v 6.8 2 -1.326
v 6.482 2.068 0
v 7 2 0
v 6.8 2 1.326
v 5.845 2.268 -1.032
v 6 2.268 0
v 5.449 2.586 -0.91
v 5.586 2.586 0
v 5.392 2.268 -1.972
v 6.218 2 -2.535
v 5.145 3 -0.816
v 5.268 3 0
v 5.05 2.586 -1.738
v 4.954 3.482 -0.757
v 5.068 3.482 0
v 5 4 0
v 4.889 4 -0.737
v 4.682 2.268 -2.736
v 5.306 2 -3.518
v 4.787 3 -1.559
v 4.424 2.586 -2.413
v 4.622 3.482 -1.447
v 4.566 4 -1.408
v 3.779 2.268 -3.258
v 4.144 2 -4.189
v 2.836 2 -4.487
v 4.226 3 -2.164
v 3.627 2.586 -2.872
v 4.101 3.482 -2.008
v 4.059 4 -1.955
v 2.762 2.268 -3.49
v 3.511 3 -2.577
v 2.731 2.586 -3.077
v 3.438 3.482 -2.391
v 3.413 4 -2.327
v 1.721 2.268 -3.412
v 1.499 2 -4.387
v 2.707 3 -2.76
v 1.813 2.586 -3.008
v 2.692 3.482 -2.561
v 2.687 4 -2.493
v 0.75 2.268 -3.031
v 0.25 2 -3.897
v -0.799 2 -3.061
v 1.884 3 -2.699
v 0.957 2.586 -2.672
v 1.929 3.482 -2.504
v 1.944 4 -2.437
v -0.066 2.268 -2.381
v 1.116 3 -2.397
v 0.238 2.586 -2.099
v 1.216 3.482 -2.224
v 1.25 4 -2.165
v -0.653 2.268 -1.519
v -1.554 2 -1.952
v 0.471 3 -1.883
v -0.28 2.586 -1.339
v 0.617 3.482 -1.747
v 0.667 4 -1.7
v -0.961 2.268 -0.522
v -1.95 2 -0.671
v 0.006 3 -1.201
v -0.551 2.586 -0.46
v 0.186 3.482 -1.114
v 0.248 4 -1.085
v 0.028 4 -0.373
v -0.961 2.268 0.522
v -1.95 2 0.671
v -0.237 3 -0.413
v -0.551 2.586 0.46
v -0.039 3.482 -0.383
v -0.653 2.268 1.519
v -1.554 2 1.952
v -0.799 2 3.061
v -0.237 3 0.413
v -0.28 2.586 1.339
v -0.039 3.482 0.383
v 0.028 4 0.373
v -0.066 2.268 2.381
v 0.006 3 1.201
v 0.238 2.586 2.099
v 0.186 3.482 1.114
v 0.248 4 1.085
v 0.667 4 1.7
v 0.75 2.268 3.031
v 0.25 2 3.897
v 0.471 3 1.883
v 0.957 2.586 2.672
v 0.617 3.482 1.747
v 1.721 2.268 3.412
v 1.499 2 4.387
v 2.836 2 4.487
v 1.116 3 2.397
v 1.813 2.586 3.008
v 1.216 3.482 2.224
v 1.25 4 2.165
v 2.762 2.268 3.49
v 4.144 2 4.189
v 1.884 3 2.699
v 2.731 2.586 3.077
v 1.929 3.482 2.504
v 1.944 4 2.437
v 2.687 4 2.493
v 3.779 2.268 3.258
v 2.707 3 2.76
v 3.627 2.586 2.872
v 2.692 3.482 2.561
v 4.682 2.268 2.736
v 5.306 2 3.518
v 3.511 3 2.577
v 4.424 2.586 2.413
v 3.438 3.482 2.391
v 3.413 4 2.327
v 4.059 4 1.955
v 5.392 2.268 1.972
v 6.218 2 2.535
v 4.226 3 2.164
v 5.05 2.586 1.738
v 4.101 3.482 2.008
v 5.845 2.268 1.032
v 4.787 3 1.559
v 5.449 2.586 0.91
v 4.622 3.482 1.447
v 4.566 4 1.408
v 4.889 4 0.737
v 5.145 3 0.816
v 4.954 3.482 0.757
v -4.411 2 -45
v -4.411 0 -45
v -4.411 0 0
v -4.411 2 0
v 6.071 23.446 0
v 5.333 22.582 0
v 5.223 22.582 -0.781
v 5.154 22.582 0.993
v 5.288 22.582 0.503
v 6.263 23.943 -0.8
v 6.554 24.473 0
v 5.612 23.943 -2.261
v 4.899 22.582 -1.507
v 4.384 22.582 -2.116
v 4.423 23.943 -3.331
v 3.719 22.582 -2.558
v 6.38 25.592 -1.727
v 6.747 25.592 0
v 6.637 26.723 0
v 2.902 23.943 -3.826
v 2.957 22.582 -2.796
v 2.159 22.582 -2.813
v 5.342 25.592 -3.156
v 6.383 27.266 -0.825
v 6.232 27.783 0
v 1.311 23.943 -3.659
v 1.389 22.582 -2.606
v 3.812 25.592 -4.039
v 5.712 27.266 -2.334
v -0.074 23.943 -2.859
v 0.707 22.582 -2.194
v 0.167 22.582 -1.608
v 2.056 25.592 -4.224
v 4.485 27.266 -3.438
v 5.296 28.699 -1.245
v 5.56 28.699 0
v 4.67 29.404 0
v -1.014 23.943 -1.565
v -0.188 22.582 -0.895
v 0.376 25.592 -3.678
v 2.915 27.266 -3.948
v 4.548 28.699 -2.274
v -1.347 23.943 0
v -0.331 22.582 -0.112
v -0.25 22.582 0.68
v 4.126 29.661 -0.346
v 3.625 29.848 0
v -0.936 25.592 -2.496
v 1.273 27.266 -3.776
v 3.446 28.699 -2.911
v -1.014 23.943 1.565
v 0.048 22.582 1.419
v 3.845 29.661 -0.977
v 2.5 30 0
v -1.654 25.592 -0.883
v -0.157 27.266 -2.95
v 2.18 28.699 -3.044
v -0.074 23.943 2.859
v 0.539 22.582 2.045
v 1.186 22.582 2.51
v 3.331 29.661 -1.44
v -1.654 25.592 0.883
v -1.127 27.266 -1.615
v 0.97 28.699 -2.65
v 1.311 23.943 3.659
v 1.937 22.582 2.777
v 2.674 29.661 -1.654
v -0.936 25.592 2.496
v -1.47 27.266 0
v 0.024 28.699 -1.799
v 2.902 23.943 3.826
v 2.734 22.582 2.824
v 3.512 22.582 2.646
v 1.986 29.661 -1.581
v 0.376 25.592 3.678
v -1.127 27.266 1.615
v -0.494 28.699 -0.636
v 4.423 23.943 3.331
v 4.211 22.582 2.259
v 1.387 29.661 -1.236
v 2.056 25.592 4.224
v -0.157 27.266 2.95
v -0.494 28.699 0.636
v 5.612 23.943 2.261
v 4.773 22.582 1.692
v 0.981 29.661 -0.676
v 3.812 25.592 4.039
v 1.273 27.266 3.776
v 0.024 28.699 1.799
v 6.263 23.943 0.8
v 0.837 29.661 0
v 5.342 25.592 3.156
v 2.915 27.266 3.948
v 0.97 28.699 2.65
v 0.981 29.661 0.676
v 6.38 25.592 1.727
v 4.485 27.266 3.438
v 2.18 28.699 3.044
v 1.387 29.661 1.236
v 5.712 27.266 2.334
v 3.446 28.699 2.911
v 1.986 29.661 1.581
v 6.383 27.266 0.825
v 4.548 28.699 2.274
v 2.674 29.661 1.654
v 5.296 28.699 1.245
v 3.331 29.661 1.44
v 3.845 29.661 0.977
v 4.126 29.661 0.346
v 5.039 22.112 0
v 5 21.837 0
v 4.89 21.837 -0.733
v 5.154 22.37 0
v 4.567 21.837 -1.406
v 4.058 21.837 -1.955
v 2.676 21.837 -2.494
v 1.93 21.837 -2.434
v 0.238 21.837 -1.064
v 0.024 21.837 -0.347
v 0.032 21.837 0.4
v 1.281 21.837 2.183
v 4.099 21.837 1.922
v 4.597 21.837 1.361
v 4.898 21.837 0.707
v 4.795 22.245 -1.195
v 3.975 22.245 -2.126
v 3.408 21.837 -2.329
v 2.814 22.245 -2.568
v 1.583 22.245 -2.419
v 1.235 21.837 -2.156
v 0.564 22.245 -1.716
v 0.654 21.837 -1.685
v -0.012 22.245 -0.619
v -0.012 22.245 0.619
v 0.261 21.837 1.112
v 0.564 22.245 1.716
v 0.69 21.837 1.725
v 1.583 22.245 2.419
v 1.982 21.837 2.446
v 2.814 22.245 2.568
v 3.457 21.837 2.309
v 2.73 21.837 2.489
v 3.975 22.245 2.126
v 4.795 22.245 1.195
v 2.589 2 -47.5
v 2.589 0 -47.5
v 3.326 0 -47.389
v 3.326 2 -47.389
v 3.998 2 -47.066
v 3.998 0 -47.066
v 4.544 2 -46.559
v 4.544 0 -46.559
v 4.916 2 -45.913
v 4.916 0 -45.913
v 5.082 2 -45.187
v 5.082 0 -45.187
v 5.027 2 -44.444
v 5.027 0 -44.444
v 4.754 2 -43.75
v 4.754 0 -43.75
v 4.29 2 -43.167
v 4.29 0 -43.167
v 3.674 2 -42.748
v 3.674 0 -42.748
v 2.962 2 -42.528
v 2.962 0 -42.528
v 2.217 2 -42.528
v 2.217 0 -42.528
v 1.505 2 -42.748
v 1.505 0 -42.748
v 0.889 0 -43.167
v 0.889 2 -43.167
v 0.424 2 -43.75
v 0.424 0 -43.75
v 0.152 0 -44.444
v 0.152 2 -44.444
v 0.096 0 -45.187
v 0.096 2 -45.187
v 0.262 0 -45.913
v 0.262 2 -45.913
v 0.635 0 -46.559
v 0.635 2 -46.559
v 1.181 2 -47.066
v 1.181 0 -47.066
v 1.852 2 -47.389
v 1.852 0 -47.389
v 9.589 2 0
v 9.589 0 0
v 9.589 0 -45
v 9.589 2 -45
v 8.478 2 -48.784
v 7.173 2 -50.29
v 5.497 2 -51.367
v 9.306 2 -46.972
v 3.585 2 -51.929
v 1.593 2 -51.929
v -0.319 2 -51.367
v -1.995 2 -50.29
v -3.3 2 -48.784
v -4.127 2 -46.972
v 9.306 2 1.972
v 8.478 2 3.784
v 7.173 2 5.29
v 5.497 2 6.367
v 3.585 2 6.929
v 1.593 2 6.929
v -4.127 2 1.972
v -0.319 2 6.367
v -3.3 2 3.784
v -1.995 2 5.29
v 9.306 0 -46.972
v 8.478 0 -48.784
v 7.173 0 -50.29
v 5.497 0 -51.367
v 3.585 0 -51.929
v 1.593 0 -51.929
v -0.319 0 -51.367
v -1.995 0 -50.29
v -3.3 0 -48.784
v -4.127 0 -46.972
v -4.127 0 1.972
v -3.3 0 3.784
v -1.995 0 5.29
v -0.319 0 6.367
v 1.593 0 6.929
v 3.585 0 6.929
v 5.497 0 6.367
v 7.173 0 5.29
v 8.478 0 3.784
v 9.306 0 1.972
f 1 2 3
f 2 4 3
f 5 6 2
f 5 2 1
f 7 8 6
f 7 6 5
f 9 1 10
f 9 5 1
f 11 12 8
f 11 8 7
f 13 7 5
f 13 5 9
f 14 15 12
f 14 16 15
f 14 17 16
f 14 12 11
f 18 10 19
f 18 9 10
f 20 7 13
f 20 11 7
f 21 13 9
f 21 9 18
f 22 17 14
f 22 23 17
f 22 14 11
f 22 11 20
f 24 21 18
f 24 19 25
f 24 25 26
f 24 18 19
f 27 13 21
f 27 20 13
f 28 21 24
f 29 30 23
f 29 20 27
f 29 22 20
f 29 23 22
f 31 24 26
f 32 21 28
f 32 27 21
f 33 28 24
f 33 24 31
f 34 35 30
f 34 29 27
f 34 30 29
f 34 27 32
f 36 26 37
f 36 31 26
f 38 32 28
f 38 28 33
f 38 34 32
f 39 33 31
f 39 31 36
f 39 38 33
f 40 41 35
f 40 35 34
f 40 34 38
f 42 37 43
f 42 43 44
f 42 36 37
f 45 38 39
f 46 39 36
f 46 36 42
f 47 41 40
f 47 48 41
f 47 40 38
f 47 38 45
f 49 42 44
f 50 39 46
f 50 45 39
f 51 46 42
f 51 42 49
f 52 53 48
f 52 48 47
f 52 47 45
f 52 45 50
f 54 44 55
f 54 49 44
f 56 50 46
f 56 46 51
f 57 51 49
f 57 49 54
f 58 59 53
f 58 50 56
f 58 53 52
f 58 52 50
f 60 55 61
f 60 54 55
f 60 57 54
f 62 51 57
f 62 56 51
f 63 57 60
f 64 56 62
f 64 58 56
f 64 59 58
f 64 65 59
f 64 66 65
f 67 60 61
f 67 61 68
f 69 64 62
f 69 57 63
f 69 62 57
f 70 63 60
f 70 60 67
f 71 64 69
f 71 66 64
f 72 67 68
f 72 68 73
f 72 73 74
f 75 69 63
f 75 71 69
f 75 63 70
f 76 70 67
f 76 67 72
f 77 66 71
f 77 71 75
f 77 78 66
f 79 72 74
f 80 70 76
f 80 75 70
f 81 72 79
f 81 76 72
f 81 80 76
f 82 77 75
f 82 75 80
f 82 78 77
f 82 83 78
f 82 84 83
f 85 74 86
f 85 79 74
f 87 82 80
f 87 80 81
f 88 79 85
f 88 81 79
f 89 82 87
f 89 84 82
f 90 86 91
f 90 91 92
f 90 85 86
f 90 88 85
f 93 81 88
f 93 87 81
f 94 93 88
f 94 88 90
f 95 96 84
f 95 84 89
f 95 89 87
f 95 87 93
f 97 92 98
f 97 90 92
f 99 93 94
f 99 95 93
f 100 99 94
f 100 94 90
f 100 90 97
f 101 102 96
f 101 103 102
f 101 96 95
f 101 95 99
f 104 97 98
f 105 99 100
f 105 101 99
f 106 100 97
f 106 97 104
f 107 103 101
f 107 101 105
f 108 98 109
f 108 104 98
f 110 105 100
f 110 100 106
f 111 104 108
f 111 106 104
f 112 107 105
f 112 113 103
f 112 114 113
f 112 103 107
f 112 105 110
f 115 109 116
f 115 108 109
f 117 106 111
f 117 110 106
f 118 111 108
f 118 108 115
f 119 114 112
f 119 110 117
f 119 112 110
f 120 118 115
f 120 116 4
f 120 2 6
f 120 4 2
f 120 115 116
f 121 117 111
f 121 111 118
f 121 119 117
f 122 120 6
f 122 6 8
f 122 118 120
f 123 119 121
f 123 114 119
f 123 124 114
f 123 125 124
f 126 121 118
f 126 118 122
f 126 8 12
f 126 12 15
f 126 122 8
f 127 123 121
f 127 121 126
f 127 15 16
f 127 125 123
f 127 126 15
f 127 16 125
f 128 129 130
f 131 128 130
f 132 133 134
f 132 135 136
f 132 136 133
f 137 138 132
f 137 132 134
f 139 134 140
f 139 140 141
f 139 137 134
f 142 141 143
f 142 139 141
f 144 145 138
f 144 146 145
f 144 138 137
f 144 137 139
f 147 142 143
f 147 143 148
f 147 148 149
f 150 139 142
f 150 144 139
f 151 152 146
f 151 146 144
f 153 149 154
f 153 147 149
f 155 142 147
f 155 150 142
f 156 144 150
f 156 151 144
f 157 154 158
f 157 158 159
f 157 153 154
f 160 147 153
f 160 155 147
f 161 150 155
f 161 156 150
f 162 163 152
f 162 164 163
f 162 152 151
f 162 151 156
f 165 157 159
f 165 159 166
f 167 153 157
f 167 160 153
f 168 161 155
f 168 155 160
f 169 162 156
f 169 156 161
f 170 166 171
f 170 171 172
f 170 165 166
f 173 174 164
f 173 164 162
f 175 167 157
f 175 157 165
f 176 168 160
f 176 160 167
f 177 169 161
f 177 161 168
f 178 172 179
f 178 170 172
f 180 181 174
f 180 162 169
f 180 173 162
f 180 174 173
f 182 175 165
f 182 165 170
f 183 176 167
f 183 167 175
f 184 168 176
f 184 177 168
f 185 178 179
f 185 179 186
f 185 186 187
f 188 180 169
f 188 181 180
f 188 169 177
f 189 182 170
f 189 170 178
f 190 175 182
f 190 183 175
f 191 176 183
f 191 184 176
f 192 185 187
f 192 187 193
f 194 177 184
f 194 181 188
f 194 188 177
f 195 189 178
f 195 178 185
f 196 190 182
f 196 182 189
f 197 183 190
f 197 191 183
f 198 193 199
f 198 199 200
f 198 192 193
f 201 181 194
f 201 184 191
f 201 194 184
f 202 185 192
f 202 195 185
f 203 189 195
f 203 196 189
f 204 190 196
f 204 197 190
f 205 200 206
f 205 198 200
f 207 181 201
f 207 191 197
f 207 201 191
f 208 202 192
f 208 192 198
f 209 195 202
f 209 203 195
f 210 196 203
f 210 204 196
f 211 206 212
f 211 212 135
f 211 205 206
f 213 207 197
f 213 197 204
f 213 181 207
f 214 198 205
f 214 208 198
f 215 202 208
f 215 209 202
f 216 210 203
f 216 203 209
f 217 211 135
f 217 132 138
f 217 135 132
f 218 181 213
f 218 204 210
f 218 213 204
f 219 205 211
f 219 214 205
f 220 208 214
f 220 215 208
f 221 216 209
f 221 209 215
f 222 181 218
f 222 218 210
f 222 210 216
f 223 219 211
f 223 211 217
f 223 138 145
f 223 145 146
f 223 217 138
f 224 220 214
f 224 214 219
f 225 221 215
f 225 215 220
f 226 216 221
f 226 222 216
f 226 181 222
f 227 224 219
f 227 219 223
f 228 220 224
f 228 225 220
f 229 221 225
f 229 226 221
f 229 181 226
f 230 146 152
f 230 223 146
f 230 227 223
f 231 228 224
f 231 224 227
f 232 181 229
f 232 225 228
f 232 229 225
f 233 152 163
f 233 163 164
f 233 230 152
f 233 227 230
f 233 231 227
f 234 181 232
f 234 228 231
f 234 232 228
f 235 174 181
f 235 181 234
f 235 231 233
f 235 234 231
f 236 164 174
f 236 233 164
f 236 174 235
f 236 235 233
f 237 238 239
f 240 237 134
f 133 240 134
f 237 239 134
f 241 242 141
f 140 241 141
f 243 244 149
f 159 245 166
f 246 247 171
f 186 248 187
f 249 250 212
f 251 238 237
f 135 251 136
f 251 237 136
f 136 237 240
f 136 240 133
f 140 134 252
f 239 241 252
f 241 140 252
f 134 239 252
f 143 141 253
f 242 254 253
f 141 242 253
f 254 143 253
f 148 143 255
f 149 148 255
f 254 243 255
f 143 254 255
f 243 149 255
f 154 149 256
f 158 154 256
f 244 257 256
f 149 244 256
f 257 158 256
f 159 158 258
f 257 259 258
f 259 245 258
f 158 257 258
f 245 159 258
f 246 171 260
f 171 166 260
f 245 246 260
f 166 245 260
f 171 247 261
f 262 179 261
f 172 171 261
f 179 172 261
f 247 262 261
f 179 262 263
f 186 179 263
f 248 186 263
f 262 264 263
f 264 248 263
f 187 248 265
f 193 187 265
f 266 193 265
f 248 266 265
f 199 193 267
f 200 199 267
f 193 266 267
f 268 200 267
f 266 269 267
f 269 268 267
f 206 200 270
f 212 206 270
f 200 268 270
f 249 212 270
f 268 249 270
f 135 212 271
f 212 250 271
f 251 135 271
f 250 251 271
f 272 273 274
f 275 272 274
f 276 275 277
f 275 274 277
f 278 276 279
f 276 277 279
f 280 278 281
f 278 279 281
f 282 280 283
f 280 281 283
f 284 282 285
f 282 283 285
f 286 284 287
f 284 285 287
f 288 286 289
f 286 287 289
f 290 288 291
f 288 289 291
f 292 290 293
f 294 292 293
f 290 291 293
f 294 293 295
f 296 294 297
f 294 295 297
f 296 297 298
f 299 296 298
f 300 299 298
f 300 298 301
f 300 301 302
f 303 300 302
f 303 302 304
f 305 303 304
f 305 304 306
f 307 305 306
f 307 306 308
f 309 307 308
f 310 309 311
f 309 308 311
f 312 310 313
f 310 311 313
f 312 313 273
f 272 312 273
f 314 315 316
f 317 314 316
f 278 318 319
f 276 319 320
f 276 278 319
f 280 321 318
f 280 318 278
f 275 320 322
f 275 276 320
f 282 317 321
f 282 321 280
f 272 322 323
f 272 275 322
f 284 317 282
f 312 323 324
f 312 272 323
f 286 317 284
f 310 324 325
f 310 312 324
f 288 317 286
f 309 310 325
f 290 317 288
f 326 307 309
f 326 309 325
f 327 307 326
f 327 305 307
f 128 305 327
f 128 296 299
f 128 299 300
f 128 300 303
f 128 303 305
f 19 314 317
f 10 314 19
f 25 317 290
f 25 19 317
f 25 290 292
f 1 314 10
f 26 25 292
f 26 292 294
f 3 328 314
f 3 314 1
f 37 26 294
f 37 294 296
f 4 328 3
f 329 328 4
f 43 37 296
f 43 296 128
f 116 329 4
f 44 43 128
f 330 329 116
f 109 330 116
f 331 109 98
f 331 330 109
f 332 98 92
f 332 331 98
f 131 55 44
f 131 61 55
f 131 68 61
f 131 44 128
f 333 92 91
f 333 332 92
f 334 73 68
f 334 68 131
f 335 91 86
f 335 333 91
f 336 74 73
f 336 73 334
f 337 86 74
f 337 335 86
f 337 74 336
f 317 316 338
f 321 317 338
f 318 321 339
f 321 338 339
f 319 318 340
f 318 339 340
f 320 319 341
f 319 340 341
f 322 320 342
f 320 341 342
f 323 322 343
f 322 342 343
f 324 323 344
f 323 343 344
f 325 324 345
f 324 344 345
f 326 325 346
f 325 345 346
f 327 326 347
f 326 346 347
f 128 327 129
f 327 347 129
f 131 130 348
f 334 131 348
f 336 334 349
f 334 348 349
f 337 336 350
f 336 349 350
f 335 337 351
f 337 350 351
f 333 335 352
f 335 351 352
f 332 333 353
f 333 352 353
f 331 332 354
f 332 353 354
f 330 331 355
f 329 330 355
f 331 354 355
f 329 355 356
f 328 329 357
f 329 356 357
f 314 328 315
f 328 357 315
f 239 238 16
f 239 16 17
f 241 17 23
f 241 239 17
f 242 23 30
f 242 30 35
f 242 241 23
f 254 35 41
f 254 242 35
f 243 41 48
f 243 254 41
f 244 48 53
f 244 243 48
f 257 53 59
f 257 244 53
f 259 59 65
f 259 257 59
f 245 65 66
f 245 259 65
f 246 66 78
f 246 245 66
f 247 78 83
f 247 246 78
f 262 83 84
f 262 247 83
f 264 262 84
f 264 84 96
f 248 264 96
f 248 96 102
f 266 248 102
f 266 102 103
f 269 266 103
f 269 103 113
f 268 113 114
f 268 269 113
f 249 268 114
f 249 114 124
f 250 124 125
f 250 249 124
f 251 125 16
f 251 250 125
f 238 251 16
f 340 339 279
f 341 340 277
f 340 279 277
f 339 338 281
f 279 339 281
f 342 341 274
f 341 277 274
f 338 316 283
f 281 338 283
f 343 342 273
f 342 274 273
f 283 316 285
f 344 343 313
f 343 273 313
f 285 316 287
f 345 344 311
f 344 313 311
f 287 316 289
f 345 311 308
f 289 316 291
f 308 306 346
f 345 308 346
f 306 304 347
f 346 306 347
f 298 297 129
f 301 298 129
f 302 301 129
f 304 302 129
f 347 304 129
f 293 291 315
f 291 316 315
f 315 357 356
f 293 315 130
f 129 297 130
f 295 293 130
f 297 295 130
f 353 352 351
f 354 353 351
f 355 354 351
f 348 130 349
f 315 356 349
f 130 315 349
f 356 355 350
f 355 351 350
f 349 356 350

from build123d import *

# Parameters (mm, degrees)
SKETCH4_R           = 2.5
BOSS_EXTRUDE1_DEPTH = 2
FILLET1_R           = 2
FILLET2_R           = 1


with BuildPart() as part:
    # Sketch3 → Revolve1 (revolve)
    with BuildSketch(Plane.XY, mode=Mode.PRIVATE) as revolve1_sk:
        with BuildLine():
            Line((0, 0), (0, 22.313068229))
            ThreePointArc((0, 22.313068229), (-1.541624675, 27.064446646), (2.5, 30))
            Line((2.5, 30), (2.5, 0))
            Line((2.5, 0), (0, 0))
        make_face()
    revolve(revolve1_sk.sketch.rotate(Axis((2.5, 0, 0), (0, 1, 0)), 180), axis=Axis((2.5, 0, 0), (0, 1, 0)))

    # Sketch4 → Boss-Extrude1 (add)
    with BuildSketch(Plane.XZ):
        with BuildLine():
            Line((9.589249496, 0), (9.589249496, -45))
            ThreePointArc((9.589249496, -45), (2.589249496, -52), (-4.410750504, -45))
            Line((-4.410750504, -45), (-4.410750504, 0))
            ThreePointArc((-4.410750504, 0), (2.589249496, 7), (9.589249496, 0))
        make_face()
        with Locations(Location((2.589249496, -45, 0), (0, 0, 270))):
            Circle(SKETCH4_R, mode=Mode.SUBTRACT)
    extrude(amount=-BOSS_EXTRUDE1_DEPTH)

    # Fillet1
    fillet1_edges = [part.edges().sort_by_distance(p)[0] for p in [
        (0, 2, 0),
    ]]
    fillet(fillet1_edges, radius=FILLET1_R)

    # Fillet2
    fillet2_edges = [part.edges().sort_by_distance(p)[0] for p in [
        (0, 22.313068229, 0),
    ]]
    fillet(fillet2_edges, radius=FILLET2_R)


solid = part.part
